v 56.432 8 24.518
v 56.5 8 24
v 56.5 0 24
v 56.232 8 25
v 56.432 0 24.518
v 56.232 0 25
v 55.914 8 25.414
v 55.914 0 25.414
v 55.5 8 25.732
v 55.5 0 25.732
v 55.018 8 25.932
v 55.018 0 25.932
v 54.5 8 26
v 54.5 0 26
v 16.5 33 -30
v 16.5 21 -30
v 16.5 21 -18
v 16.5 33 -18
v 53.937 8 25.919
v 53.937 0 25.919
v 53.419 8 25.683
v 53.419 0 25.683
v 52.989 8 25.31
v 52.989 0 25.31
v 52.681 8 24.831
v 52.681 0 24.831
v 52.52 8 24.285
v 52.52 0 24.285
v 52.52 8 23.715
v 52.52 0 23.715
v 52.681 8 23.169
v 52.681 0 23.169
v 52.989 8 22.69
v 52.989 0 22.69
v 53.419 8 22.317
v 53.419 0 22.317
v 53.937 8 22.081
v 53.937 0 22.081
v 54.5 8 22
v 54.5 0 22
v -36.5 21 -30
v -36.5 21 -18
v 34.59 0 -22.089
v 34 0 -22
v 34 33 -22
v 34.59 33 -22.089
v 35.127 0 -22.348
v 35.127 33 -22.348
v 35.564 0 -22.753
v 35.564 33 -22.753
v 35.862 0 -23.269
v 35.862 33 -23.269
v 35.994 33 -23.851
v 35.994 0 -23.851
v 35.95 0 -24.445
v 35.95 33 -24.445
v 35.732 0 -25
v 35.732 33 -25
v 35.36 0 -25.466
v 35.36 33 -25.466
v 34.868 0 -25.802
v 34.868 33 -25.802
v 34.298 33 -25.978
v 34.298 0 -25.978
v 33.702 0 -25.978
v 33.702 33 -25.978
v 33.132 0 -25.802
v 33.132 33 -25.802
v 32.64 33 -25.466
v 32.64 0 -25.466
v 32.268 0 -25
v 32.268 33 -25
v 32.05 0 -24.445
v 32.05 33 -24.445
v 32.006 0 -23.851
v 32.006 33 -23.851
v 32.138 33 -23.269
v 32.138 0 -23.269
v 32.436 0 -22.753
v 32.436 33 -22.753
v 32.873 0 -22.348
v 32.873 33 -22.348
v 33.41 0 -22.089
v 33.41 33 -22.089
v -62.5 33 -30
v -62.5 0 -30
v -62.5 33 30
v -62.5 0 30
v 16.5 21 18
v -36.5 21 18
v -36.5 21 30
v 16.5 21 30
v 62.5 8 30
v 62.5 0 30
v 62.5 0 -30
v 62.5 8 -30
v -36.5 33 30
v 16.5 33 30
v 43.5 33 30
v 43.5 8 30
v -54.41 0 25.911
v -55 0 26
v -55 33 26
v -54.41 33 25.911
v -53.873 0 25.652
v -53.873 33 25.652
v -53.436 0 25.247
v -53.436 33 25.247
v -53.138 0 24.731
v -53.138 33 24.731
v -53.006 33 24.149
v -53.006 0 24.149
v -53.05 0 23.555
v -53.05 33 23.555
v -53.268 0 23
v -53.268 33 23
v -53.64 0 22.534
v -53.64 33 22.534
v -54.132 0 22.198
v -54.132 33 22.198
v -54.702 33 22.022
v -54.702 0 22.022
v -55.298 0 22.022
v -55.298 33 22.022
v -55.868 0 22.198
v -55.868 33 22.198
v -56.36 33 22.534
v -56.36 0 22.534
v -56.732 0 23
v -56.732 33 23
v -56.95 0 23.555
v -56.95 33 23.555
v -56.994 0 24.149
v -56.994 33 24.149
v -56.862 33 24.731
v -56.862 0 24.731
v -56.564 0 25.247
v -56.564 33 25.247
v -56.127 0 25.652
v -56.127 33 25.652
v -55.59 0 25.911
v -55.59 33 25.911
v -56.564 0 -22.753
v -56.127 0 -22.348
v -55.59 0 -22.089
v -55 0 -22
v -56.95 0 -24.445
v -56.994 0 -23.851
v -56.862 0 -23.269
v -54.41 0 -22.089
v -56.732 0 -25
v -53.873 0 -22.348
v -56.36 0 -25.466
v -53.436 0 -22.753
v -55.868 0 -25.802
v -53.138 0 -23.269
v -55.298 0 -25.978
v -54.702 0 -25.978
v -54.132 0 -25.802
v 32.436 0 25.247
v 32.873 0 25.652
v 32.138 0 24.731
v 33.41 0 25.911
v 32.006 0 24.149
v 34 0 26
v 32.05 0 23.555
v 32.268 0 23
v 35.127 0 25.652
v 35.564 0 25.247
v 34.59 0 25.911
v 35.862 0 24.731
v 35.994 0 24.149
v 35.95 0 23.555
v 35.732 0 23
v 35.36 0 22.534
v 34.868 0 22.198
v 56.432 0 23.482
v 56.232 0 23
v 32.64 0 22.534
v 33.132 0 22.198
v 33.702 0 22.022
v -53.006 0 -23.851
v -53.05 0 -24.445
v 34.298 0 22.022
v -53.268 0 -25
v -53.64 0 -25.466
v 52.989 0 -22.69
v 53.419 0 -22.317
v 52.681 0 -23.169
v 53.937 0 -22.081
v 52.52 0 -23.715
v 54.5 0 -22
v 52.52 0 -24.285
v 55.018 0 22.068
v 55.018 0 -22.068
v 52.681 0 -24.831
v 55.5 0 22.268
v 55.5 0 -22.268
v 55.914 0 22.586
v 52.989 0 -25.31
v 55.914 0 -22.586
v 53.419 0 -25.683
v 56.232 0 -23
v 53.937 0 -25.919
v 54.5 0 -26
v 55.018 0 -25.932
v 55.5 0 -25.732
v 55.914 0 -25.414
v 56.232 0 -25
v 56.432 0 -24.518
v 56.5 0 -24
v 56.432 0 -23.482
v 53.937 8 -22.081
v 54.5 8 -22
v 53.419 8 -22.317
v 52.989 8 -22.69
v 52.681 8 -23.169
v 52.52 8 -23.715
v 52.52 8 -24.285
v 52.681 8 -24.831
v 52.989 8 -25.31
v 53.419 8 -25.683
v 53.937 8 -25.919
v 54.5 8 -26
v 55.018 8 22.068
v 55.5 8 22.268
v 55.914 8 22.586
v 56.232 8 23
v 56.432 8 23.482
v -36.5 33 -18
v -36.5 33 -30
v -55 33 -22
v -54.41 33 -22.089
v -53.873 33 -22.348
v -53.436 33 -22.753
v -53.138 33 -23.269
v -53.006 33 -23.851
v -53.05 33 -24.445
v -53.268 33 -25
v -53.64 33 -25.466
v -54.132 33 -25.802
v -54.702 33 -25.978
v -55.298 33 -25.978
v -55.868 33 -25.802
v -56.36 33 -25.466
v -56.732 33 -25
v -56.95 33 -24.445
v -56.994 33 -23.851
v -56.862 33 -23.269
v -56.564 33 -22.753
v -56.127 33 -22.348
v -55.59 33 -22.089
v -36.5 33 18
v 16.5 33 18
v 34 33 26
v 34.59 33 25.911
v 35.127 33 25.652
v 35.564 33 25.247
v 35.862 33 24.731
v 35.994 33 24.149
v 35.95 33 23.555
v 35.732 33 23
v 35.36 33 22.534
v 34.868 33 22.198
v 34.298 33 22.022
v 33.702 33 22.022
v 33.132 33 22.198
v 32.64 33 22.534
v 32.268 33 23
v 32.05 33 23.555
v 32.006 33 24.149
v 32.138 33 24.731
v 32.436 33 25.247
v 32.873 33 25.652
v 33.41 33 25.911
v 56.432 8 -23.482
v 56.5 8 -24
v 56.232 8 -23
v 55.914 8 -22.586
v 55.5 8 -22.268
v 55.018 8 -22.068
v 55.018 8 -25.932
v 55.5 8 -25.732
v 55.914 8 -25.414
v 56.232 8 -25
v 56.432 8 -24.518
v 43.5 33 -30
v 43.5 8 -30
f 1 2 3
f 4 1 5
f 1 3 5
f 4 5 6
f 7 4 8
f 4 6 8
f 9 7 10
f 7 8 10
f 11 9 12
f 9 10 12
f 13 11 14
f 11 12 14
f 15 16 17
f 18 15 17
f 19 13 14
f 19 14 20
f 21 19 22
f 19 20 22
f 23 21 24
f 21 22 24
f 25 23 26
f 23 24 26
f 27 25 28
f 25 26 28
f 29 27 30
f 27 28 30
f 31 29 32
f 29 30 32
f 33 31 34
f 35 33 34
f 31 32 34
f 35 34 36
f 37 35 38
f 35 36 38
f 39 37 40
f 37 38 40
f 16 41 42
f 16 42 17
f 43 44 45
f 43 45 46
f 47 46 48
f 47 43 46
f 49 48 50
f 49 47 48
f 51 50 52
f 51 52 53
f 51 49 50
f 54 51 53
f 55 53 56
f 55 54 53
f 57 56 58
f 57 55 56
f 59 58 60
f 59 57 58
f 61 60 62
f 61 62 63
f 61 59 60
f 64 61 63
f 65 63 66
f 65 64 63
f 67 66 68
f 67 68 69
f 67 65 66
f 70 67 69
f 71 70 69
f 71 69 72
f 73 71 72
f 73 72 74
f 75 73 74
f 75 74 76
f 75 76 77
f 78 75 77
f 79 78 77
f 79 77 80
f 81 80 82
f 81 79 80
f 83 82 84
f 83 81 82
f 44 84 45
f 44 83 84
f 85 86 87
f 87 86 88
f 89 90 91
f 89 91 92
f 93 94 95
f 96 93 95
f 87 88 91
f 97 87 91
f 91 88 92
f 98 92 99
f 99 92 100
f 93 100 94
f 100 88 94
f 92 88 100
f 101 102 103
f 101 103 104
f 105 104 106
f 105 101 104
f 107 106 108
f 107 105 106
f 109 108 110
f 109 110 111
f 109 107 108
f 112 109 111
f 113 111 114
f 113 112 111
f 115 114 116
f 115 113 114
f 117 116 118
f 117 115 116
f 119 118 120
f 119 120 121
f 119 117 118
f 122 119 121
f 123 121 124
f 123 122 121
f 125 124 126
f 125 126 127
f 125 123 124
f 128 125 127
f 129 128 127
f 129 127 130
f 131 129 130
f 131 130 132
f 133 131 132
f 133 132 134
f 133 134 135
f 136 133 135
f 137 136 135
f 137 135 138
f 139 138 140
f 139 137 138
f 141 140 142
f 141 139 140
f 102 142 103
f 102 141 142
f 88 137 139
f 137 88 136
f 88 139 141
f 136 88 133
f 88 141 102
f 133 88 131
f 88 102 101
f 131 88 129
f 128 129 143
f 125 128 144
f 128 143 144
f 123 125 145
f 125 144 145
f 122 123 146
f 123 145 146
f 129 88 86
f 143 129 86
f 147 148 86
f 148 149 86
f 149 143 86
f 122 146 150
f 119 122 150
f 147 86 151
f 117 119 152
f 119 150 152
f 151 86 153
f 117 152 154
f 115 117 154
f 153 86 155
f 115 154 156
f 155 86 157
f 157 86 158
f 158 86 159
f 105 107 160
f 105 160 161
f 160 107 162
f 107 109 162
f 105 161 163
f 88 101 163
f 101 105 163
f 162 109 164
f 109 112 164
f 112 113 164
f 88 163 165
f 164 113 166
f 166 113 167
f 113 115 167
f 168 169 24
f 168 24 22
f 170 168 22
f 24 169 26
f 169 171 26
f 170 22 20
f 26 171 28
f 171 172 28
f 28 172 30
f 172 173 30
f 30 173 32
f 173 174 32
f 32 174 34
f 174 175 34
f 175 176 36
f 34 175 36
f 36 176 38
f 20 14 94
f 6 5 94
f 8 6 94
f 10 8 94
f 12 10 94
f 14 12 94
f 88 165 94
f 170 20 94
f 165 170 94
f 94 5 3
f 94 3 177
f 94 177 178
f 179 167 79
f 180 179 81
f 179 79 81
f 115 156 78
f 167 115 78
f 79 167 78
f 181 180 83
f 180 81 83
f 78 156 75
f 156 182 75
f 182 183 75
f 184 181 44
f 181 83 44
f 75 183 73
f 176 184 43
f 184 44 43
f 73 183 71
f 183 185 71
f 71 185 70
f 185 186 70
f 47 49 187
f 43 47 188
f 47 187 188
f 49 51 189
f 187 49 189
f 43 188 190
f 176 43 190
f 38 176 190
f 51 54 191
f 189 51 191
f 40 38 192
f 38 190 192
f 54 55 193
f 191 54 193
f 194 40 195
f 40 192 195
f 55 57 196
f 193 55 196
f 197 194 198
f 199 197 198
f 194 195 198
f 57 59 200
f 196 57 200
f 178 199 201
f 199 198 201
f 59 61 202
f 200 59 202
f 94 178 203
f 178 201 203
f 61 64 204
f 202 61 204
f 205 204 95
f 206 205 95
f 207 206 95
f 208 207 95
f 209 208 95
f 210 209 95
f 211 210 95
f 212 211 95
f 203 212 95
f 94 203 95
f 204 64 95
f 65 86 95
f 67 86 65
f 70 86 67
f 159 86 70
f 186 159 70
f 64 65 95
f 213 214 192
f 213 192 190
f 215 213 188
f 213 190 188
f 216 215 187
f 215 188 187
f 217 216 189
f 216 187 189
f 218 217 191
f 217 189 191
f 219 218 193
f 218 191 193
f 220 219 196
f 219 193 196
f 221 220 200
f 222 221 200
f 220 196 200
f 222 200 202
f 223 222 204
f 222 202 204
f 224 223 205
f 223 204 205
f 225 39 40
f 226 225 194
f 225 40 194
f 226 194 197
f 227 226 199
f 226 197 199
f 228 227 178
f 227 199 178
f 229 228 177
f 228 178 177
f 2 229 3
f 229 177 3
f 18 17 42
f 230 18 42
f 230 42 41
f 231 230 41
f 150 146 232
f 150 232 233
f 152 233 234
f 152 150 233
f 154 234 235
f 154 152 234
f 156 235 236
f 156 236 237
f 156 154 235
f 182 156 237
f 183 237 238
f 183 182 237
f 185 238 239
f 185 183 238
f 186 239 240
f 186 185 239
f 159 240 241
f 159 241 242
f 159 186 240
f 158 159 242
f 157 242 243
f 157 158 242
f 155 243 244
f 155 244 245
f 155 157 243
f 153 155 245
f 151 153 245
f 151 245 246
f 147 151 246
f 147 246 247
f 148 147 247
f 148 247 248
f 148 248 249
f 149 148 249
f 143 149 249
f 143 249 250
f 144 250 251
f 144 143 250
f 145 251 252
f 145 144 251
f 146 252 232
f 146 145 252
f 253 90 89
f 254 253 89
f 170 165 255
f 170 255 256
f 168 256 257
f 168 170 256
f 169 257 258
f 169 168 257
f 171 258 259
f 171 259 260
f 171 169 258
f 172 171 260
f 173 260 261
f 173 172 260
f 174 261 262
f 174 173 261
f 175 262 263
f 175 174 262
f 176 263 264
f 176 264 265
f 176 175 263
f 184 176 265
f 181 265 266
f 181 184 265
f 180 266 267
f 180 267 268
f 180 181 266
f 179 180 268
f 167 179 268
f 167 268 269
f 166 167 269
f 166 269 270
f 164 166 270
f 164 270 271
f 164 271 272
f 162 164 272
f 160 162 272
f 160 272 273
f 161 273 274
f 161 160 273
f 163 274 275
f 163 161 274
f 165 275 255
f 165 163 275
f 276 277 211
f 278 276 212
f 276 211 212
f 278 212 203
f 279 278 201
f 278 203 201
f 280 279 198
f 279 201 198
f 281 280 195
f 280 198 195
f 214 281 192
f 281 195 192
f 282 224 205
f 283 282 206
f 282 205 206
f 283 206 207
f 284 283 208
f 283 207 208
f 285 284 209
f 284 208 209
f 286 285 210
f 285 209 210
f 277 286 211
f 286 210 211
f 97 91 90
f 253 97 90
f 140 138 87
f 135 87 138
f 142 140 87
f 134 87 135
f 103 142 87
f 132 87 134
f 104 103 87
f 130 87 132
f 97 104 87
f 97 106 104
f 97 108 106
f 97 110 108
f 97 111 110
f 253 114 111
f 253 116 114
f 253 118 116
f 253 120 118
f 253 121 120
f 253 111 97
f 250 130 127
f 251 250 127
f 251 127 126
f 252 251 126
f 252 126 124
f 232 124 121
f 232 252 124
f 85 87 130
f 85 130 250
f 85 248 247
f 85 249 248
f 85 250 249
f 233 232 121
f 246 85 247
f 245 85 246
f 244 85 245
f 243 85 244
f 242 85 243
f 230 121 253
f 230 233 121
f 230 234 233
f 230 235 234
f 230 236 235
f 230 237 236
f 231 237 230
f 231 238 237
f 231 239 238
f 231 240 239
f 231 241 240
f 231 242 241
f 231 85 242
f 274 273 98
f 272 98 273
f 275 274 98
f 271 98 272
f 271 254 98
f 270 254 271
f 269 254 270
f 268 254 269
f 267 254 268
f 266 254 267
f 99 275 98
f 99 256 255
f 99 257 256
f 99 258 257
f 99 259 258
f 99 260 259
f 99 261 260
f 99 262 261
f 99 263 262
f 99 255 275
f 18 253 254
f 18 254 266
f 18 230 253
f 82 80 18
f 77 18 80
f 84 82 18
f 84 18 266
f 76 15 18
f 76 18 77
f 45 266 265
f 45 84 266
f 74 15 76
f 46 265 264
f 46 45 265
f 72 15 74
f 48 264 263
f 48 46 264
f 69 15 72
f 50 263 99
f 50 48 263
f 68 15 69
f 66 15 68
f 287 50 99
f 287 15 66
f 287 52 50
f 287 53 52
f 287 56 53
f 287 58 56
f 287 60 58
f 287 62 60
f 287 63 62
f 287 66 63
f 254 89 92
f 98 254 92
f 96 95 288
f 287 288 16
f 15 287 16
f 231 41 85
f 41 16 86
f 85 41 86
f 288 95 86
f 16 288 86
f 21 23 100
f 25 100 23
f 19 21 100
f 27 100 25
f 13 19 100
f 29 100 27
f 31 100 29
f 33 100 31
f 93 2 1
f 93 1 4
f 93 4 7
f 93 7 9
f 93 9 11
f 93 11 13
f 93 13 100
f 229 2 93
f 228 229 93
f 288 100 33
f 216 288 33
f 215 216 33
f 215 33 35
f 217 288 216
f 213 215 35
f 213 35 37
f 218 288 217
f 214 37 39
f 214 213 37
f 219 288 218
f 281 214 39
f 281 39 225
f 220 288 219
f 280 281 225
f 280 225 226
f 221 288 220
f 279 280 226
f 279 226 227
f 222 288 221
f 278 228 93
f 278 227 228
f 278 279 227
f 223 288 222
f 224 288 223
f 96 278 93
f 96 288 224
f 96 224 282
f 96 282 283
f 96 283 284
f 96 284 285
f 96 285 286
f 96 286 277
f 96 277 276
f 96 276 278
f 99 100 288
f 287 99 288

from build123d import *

# Parameters (mm, degrees)
SKETCH1_R           = 2
BOSS_EXTRUDE1_DEPTH = 33
SKETCH1_3_W         = 53
SKETCH1_3_H         = 12
BOSS_EXTRUDE2_DEPTH = 21
SKETCH1_4_W         = 19
SKETCH1_4_H         = 60
SKETCH1_4_R         = 2
BOSS_EXTRUDE3_DEPTH = 8


with BuildPart() as part:
    # Sketch1 → Boss-Extrude1 (new body)
    with BuildSketch(Plane(origin=(0, 0, 0), x_dir=(1, 0, 0), z_dir=(0, 1, 0))):
        Polygon((43.5, -30), (43.5, 30), (16.5, 30), (16.5, 18), (-36.5, 18), (-36.5, 30), (-62.5, 30), (-62.5, -30), (-36.5, -30), (-36.5, -18), (16.5, -18), (16.5, -30), align=None)
        with Locations((-55, -24)):
            Circle(SKETCH1_R, mode=Mode.SUBTRACT)
        with Locations((34, -24)):
            Circle(SKETCH1_R, mode=Mode.SUBTRACT)
        with Locations((-55, 24)):
            Circle(SKETCH1_R, mode=Mode.SUBTRACT)
        with Locations((34, 24)):
            Circle(SKETCH1_R, mode=Mode.SUBTRACT)
    extrude(amount=BOSS_EXTRUDE1_DEPTH)

    # Sketch1<3> → Boss-Extrude2 (add)
    with BuildSketch(Plane(origin=(0, 0, 0), x_dir=(1, 0, 0), z_dir=(0, 1, 0))):
        with Locations((-10, 24)):
            Rectangle(SKETCH1_3_W, SKETCH1_3_H)
        with Locations((-10, -24)):
            Rectangle(SKETCH1_3_W, SKETCH1_3_H)
    extrude(amount=BOSS_EXTRUDE2_DEPTH)

    # Sketch1<4> → Boss-Extrude3 (add)
    with BuildSketch(Plane(origin=(0, 0, 0), x_dir=(1, 0, 0), z_dir=(0, 1, 0))):
        with Locations((53, 0)):
            Rectangle(SKETCH1_4_W, SKETCH1_4_H)
        with Locations((54.5, 24)):
            Circle(SKETCH1_4_R, mode=Mode.SUBTRACT)
        with Locations((54.5, -24)):
            Circle(SKETCH1_4_R, mode=Mode.SUBTRACT)
    extrude(amount=BOSS_EXTRUDE3_DEPTH)


solid = part.part
